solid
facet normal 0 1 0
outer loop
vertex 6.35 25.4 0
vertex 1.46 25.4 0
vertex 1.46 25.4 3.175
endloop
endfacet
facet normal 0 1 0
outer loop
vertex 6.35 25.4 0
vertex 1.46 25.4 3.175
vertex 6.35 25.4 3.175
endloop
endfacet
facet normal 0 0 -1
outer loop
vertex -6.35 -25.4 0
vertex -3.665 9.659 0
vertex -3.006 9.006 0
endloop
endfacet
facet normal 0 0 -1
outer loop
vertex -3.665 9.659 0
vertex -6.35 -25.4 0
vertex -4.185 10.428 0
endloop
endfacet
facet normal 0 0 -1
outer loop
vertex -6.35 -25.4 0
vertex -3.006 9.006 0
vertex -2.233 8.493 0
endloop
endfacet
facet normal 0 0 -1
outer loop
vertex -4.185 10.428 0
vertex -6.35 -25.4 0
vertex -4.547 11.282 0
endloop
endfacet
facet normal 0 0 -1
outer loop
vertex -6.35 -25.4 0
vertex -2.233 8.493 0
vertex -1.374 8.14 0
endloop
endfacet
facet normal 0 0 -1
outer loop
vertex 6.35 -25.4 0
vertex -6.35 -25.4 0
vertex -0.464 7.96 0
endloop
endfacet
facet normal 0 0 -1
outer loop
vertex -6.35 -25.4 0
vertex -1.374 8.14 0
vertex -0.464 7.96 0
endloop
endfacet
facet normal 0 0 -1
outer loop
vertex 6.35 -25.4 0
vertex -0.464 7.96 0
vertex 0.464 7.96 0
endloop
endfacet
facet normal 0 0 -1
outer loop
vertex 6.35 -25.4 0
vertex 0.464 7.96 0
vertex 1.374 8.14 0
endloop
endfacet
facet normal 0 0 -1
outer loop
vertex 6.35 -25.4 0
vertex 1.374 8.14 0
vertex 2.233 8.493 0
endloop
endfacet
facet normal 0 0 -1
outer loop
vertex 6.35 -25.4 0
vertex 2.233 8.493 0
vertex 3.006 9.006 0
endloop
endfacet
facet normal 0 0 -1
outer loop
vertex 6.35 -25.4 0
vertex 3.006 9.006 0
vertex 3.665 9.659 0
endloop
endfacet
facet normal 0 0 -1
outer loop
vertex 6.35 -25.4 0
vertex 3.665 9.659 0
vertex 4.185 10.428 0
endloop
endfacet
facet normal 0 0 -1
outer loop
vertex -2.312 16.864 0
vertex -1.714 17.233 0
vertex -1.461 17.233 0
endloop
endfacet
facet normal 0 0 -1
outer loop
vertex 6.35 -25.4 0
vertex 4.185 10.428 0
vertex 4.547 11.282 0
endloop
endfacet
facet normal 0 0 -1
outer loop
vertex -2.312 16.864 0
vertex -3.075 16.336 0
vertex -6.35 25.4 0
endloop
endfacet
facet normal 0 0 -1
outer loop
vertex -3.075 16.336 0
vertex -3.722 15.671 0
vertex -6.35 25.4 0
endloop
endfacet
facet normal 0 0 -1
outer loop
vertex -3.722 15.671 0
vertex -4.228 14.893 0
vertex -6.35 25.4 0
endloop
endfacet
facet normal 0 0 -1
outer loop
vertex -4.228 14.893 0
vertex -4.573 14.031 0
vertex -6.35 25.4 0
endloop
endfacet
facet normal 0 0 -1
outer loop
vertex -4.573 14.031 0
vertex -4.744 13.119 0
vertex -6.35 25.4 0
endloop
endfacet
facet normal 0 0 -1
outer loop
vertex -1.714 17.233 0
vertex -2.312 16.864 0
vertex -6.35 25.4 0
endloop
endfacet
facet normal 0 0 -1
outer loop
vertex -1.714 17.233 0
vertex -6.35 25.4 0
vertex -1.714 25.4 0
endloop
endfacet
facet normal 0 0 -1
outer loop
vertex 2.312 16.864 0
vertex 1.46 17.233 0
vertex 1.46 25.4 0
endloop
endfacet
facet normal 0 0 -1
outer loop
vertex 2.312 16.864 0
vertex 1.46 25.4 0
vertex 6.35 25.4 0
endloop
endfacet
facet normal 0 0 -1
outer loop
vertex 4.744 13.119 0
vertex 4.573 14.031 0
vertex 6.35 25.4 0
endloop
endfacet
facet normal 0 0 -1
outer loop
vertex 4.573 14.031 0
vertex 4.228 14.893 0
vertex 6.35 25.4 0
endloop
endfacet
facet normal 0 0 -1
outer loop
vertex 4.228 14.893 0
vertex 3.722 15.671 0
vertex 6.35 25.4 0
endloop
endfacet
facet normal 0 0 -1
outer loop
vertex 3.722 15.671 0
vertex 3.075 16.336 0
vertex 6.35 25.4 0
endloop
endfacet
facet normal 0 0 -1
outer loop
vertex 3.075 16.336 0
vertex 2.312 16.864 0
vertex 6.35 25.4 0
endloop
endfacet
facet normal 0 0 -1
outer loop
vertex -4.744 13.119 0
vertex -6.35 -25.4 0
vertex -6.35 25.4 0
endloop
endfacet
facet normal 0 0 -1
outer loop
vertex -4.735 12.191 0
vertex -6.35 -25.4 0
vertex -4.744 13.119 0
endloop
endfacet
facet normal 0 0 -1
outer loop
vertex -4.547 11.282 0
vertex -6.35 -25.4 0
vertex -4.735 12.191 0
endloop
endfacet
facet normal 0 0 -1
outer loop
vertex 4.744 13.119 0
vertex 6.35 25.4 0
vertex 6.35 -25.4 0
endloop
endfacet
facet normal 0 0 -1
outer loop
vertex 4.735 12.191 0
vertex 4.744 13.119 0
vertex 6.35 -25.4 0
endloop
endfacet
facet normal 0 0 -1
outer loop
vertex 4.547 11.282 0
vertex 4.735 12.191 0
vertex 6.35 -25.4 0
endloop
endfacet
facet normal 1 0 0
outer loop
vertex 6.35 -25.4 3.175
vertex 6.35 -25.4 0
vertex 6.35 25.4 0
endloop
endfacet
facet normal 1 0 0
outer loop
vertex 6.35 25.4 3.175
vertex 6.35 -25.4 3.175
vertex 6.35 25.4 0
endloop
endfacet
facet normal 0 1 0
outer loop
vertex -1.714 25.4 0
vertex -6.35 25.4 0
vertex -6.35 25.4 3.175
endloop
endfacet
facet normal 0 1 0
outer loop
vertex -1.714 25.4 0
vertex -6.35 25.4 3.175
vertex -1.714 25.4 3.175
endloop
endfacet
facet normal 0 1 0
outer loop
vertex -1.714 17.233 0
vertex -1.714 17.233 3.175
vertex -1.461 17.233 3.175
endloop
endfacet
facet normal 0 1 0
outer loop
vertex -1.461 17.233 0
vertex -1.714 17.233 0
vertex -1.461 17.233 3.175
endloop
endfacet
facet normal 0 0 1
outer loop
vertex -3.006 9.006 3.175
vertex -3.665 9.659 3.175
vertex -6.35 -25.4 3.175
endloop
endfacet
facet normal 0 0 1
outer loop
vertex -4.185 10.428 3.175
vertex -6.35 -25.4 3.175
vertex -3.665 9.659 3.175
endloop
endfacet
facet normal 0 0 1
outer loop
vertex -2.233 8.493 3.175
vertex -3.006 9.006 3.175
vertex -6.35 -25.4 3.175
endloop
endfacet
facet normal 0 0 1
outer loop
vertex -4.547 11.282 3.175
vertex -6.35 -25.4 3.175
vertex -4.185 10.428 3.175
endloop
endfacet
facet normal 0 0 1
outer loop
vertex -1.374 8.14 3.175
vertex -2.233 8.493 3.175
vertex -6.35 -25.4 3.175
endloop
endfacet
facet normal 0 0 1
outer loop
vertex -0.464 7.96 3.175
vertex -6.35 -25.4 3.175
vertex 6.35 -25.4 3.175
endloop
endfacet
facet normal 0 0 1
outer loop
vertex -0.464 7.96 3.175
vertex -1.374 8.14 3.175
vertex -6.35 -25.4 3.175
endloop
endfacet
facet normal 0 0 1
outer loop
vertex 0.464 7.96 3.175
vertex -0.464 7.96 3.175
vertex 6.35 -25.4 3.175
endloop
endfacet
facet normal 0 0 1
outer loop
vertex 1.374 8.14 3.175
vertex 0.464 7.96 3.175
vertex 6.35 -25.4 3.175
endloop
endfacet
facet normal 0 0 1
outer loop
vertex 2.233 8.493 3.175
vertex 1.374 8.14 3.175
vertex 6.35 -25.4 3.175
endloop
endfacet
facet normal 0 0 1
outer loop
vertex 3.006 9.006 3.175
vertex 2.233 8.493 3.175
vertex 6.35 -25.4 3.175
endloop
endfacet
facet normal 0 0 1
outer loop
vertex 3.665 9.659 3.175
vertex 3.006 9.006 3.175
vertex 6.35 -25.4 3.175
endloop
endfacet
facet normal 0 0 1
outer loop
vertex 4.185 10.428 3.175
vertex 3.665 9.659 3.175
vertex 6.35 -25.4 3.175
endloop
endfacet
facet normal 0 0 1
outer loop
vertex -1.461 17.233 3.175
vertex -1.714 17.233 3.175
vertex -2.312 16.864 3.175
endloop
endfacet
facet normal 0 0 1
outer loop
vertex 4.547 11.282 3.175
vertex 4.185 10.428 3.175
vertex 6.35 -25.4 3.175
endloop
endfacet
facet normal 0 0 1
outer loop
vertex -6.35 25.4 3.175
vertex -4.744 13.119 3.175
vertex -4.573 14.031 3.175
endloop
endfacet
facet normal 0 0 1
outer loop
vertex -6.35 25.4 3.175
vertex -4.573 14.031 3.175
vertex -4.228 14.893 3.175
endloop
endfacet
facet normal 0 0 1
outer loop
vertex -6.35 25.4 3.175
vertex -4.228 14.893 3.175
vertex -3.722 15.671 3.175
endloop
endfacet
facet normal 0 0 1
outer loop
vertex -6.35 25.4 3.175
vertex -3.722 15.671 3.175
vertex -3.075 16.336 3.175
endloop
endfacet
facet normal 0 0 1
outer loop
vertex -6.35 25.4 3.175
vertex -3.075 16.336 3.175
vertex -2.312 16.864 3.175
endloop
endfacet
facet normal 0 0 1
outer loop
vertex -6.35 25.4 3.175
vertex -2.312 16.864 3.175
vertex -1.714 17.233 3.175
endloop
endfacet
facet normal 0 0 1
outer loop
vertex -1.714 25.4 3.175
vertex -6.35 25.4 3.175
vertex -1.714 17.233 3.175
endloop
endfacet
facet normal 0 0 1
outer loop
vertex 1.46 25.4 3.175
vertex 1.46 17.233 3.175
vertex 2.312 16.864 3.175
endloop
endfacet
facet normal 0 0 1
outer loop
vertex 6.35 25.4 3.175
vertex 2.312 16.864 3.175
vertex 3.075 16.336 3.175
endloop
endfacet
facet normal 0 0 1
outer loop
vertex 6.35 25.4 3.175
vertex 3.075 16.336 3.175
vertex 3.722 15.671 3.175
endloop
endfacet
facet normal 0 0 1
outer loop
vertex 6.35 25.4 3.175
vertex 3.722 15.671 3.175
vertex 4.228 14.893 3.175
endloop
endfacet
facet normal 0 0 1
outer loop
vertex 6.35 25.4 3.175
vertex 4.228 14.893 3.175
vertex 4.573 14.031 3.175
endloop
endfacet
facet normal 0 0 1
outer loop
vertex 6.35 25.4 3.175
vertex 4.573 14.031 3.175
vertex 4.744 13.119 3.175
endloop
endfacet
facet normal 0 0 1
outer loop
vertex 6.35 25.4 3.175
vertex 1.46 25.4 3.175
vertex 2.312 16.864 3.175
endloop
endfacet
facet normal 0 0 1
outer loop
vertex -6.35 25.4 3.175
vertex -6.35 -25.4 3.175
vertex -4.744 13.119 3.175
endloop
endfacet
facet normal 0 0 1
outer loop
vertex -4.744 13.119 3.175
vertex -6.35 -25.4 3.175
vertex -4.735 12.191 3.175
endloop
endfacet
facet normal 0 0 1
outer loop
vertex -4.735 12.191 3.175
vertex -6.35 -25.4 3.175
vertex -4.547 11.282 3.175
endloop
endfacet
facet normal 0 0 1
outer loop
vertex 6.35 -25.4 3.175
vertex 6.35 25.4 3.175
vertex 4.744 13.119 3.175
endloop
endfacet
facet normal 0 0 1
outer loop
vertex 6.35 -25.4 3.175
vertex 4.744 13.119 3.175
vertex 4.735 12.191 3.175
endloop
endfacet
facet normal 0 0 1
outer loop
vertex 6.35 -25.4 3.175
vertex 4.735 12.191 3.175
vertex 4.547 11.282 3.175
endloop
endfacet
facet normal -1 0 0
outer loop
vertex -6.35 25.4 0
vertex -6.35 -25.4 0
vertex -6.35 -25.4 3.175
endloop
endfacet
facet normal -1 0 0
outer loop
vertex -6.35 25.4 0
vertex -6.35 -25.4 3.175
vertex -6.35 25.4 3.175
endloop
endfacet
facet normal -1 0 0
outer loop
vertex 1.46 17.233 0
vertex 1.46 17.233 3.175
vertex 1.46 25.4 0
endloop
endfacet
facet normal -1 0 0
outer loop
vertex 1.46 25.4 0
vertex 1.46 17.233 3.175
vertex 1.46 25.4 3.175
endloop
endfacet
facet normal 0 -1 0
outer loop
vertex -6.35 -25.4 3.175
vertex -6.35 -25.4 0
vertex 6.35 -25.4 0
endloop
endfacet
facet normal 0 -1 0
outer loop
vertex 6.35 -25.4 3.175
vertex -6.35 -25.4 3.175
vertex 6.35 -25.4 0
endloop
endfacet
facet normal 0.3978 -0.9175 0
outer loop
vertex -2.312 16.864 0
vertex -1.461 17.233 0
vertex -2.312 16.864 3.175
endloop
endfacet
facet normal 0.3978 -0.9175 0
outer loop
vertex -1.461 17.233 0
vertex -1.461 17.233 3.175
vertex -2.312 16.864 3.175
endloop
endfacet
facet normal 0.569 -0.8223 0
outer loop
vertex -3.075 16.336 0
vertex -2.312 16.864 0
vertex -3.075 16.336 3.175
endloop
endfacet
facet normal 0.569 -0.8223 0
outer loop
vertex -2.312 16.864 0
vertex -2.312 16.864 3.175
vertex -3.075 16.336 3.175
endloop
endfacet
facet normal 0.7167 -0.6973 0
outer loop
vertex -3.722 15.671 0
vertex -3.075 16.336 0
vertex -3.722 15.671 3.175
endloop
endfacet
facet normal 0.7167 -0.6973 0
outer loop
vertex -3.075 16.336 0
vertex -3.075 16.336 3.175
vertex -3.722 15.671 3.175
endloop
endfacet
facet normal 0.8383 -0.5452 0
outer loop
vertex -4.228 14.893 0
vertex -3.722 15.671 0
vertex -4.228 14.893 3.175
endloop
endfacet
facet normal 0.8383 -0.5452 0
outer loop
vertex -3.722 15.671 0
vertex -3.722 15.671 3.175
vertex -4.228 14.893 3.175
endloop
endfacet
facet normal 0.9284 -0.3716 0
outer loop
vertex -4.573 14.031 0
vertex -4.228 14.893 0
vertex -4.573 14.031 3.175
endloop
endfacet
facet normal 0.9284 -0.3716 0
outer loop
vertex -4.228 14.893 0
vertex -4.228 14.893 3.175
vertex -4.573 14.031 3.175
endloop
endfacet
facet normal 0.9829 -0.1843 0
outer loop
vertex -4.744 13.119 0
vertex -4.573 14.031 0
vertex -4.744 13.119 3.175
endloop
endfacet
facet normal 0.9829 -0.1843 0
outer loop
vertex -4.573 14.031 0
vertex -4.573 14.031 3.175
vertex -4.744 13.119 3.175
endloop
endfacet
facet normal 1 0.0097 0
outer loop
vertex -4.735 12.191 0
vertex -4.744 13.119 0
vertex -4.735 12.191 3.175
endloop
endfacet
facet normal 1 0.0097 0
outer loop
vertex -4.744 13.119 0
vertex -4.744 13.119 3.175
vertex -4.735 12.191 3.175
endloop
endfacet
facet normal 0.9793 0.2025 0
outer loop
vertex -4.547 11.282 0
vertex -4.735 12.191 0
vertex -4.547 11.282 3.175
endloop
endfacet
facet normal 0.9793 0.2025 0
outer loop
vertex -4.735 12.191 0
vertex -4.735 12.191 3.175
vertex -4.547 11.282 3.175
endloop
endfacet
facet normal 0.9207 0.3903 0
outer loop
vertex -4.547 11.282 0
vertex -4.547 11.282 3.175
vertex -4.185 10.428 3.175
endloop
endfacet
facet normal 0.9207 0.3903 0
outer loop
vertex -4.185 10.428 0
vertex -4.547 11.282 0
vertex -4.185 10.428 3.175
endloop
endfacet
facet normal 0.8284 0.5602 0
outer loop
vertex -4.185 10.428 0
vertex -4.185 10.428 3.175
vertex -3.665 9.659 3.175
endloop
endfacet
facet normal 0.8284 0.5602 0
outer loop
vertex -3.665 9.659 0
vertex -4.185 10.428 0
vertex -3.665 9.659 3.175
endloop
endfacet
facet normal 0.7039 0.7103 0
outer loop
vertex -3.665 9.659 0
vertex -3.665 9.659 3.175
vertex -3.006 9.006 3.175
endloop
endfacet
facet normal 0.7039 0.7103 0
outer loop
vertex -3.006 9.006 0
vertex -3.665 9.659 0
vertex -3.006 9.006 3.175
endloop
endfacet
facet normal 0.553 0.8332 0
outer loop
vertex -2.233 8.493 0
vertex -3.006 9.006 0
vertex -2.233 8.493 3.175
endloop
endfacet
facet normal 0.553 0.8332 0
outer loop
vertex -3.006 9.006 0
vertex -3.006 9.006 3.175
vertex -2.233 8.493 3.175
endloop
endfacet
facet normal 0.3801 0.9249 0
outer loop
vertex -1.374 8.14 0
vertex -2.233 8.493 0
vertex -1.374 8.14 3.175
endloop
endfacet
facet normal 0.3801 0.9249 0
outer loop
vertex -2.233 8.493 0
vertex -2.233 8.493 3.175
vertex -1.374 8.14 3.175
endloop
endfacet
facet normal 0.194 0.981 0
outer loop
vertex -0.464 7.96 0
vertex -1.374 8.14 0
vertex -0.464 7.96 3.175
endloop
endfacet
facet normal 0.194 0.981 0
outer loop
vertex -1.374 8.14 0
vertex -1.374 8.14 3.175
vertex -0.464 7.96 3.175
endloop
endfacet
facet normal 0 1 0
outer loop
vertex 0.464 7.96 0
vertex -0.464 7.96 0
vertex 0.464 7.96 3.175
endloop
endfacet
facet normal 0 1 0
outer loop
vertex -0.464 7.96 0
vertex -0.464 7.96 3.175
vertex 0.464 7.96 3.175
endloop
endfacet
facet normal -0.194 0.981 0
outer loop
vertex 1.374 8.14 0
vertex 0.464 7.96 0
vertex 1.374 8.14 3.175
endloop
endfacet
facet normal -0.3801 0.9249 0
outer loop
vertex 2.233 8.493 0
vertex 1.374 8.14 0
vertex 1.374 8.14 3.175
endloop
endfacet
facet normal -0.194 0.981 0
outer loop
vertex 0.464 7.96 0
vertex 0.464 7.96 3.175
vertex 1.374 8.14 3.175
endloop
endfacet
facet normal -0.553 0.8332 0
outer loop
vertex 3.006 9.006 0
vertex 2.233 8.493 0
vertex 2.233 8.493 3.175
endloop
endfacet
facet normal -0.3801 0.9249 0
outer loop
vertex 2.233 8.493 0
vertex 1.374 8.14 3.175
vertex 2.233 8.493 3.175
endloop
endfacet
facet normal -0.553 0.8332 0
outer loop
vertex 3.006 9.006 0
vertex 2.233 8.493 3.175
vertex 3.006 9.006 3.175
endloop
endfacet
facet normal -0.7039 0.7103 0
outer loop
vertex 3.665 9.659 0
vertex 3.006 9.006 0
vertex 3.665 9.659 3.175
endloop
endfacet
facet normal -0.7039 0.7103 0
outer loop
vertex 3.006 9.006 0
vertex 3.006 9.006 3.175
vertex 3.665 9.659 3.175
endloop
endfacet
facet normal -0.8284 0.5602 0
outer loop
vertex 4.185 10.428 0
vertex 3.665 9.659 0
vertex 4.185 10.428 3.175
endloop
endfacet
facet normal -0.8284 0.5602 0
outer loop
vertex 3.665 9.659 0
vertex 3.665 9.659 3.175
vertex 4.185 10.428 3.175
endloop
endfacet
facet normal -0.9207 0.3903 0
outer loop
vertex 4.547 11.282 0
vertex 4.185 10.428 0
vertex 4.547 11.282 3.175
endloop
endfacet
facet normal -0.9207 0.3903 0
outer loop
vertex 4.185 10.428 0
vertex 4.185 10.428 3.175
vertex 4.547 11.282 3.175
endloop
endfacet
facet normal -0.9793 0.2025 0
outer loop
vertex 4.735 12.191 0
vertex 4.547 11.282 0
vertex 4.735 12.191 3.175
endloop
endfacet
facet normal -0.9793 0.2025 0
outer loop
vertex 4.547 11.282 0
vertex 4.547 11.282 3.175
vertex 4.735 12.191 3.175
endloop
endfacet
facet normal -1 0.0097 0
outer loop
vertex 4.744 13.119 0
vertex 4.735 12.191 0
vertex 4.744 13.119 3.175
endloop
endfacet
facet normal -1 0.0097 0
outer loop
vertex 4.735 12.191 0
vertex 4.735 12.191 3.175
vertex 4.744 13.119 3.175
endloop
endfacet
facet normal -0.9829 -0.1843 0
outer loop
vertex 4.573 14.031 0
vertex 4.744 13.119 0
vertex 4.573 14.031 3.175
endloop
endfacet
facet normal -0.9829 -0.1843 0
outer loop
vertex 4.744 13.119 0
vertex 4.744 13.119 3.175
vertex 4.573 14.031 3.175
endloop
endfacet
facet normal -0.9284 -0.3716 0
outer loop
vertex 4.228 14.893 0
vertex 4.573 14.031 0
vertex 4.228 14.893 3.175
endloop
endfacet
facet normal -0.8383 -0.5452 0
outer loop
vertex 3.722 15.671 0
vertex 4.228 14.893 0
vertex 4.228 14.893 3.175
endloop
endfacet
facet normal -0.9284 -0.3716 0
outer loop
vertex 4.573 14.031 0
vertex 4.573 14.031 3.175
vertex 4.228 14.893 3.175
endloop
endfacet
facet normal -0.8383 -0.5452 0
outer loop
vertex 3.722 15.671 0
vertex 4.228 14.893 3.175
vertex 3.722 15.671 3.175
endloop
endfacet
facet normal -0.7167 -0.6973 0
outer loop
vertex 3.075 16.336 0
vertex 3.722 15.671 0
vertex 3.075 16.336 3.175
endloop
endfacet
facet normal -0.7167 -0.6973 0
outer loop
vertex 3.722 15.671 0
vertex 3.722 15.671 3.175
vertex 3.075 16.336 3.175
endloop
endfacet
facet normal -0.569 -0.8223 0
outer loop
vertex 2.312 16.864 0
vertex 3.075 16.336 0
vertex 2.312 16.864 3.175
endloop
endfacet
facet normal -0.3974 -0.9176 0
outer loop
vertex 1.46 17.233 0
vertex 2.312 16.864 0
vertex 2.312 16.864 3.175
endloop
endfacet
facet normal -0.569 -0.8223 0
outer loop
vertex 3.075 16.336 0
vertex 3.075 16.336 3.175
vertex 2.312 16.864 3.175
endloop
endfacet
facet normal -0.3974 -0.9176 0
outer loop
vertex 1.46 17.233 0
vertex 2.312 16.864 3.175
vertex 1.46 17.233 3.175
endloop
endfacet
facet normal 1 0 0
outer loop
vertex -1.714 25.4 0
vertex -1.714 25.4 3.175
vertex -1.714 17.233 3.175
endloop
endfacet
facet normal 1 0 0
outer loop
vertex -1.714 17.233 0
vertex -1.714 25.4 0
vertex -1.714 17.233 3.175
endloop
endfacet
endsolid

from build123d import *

# Parameters (mm, degrees)
F0_W     = 12.7
F0_H     = 50.8
F1_DEPTH = 3.175
F2_R     = 4.7625
F3_DEPTH = 3.175
F5_DEPTH = 3.175


with BuildPart() as f1:
    # F0 (on Top) → F1 (new body)
    with BuildSketch(Plane.XY):
        Rectangle(F0_W, F0_H)
    extrude(amount=F1_DEPTH)

    # F2 (on face) → F3 (cut, through all)
    with BuildSketch(Plane.XY.offset(3.175)):
        with Locations((0, 12.7)):
            Circle(F2_R)
    extrude(amount=-F3_DEPTH, mode=Mode.SUBTRACT)

    # F4 (on face) → F5 (cut, through all)
    with BuildSketch(Plane.XY.offset(3.175)):
        with BuildLine():
            Line((1.4605, 25.4), (-1.7145, 25.4))
            Line((-1.7145, 25.4), (-1.7145, 17.233028))
            Line((-1.7145, 17.233028), (-1.4605, 17.233028))
            ThreePointArc((-1.4605, 17.233028), (0, 17.4625), (1.4605, 17.233028))
            Line((1.4605, 17.233028), (1.4605, 25.4))
        make_face()
    extrude(amount=-F5_DEPTH, mode=Mode.SUBTRACT)


solid = f1.part
